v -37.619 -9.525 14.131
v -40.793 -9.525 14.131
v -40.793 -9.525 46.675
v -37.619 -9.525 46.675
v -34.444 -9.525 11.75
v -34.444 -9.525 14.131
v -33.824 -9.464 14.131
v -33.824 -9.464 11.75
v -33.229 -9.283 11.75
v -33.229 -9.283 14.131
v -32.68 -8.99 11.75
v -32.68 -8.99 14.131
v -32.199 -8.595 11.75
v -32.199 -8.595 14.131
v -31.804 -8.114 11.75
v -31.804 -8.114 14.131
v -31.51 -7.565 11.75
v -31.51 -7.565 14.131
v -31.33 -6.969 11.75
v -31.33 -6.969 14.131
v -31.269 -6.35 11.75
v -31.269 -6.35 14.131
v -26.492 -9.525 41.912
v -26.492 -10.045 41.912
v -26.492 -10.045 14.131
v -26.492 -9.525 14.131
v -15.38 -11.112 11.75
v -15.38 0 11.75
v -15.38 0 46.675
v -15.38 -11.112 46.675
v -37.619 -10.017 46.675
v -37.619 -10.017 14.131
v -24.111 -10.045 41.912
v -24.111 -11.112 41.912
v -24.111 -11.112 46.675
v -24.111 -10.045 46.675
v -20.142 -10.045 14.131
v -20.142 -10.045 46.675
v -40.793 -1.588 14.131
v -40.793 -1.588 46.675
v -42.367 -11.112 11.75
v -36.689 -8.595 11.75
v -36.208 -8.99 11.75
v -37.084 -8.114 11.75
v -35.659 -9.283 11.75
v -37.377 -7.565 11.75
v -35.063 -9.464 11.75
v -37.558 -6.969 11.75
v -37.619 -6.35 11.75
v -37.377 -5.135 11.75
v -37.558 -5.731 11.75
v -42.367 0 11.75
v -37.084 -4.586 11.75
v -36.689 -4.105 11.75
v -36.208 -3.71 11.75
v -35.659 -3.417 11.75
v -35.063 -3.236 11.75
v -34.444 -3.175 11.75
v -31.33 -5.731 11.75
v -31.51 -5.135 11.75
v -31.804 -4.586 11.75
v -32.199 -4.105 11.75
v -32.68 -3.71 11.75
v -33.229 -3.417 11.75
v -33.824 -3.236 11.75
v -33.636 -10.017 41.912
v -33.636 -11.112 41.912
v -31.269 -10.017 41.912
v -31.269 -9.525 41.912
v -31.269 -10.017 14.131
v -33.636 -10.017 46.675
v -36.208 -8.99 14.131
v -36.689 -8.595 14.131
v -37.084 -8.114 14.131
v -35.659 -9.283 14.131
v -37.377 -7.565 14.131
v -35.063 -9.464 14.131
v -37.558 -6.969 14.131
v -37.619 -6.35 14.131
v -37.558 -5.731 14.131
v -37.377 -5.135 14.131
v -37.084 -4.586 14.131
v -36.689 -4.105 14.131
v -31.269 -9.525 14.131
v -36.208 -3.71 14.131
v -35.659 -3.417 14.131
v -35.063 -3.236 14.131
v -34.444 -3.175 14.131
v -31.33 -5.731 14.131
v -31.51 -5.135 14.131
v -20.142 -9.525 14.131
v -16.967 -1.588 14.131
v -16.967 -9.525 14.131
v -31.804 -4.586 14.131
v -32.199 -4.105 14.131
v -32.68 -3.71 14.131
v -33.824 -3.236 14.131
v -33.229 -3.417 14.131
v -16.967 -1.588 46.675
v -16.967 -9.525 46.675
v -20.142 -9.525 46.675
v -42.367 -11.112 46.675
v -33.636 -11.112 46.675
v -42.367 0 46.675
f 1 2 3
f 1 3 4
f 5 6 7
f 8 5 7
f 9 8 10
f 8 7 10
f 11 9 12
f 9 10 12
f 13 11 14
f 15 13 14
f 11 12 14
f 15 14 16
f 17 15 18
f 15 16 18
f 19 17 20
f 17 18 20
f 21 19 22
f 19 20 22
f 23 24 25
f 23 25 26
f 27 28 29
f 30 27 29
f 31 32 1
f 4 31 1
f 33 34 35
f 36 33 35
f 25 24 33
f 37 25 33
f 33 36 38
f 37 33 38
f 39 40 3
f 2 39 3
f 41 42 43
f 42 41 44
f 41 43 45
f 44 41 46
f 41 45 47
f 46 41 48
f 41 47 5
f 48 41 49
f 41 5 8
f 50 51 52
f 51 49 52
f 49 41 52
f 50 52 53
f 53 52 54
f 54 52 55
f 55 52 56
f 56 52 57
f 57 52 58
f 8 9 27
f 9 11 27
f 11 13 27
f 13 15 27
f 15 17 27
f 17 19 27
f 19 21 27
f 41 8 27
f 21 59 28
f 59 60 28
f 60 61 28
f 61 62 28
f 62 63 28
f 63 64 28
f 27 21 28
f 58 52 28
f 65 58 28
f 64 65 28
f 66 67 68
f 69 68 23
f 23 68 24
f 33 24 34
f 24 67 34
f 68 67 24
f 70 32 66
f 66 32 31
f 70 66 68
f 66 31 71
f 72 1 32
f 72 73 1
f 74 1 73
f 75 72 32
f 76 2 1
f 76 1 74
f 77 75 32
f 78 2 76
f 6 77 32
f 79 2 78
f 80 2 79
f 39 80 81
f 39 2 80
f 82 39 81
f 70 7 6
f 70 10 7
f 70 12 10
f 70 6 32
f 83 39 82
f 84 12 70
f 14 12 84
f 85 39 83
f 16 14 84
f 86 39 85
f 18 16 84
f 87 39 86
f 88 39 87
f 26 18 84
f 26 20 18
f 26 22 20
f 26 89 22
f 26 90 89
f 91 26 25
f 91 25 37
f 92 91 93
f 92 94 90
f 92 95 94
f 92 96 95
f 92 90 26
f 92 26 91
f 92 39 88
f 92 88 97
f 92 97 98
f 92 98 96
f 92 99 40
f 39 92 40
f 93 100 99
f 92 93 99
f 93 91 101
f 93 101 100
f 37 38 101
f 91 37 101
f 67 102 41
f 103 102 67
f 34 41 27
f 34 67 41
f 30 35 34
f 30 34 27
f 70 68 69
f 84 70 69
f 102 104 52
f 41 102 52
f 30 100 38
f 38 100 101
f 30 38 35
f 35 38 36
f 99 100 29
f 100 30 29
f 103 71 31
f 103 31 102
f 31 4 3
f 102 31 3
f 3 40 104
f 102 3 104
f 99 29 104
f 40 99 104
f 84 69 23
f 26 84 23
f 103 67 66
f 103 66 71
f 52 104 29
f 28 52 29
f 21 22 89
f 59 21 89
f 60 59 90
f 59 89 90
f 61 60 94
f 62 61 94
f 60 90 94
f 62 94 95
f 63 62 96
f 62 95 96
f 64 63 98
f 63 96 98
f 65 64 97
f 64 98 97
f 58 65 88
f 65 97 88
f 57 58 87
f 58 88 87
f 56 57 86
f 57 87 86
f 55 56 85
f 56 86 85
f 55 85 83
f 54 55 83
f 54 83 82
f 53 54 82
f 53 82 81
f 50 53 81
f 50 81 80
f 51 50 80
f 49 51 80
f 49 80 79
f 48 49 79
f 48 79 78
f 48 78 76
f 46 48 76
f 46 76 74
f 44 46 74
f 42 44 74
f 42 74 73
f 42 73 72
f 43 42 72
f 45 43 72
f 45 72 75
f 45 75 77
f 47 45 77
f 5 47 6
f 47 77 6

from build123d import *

# Parameters (mm, degrees)
F1_DEPTH = 11.1125
F2_W     = 6.35
F2_H     = 0.5200478494
F2_H_2   = 0.4923428655
F3_DEPTH = 32.54375
F5_DEPTH = 2.38225
F6_W     = 9.525
F6_H     = 4.7625
F7_DEPTH = 3.175


# Not quite as in the source:
# - a feature names something its author has since deleted; it is built from what else it names


with BuildPart() as f1:
    # F0 (on Front) → F1 (new body)
    with BuildSketch(Plane.XZ):
        Polygon((-30.725677704, 46.6747839019), (-42.3673422778, 46.6747839019), (-42.3673422778, 11.7497839019), (-15.3798422778, 11.7497839019), (-15.3798422778, 46.6747839019), align=None)
    extrude(amount=F1_DEPTH)

    # F2 (on face) → F3 (cut)
    with BuildSketch(Plane.XY.offset(46.6747839019)):
        Polygon((-16.9673422778, -9.525), (-16.9673422778, -1.5875), (-20.1423422778, -1.5875), (-40.7925422778, -1.5875), (-40.7925422778, -9.525), (-37.6187860966, -9.525), (-31.2687860966, -9.525), (-26.4923422778, -9.525), (-20.1423422778, -9.525), align=None)
        with Locations((-23.3173422778, -9.7850239247)):
            Rectangle(F2_W, F2_H)
        with Locations((-34.4437860966, -9.7711714327)):
            Rectangle(F2_W, F2_H_2)
    extrude(amount=-F3_DEPTH, mode=Mode.SUBTRACT)

    # F4 (on face) → F5 (cut, through all)
    with BuildSketch(Plane.XY.offset(14.1310339019)):
        with BuildLine():
            ThreePointArc((-34.4437860966, -9.525), (-32.1987220663, -8.5950640303), (-31.2687860966, -6.35))
            ThreePointArc((-31.2687860966, -6.35), (-36.6888501268, -4.1049359697), (-34.4437860966, -9.525))
        make_face()
    extrude(amount=-F5_DEPTH, mode=Mode.SUBTRACT)

    # F6 (on face) → F7 (cut)
    with BuildSketch(Plane.XZ.offset(11.1125)):
        with Locations((-28.8735922778, 44.2935339019)):
            Rectangle(F6_W, F6_H)
    extrude(amount=-F7_DEPTH, mode=Mode.SUBTRACT)


solid = f1.part
